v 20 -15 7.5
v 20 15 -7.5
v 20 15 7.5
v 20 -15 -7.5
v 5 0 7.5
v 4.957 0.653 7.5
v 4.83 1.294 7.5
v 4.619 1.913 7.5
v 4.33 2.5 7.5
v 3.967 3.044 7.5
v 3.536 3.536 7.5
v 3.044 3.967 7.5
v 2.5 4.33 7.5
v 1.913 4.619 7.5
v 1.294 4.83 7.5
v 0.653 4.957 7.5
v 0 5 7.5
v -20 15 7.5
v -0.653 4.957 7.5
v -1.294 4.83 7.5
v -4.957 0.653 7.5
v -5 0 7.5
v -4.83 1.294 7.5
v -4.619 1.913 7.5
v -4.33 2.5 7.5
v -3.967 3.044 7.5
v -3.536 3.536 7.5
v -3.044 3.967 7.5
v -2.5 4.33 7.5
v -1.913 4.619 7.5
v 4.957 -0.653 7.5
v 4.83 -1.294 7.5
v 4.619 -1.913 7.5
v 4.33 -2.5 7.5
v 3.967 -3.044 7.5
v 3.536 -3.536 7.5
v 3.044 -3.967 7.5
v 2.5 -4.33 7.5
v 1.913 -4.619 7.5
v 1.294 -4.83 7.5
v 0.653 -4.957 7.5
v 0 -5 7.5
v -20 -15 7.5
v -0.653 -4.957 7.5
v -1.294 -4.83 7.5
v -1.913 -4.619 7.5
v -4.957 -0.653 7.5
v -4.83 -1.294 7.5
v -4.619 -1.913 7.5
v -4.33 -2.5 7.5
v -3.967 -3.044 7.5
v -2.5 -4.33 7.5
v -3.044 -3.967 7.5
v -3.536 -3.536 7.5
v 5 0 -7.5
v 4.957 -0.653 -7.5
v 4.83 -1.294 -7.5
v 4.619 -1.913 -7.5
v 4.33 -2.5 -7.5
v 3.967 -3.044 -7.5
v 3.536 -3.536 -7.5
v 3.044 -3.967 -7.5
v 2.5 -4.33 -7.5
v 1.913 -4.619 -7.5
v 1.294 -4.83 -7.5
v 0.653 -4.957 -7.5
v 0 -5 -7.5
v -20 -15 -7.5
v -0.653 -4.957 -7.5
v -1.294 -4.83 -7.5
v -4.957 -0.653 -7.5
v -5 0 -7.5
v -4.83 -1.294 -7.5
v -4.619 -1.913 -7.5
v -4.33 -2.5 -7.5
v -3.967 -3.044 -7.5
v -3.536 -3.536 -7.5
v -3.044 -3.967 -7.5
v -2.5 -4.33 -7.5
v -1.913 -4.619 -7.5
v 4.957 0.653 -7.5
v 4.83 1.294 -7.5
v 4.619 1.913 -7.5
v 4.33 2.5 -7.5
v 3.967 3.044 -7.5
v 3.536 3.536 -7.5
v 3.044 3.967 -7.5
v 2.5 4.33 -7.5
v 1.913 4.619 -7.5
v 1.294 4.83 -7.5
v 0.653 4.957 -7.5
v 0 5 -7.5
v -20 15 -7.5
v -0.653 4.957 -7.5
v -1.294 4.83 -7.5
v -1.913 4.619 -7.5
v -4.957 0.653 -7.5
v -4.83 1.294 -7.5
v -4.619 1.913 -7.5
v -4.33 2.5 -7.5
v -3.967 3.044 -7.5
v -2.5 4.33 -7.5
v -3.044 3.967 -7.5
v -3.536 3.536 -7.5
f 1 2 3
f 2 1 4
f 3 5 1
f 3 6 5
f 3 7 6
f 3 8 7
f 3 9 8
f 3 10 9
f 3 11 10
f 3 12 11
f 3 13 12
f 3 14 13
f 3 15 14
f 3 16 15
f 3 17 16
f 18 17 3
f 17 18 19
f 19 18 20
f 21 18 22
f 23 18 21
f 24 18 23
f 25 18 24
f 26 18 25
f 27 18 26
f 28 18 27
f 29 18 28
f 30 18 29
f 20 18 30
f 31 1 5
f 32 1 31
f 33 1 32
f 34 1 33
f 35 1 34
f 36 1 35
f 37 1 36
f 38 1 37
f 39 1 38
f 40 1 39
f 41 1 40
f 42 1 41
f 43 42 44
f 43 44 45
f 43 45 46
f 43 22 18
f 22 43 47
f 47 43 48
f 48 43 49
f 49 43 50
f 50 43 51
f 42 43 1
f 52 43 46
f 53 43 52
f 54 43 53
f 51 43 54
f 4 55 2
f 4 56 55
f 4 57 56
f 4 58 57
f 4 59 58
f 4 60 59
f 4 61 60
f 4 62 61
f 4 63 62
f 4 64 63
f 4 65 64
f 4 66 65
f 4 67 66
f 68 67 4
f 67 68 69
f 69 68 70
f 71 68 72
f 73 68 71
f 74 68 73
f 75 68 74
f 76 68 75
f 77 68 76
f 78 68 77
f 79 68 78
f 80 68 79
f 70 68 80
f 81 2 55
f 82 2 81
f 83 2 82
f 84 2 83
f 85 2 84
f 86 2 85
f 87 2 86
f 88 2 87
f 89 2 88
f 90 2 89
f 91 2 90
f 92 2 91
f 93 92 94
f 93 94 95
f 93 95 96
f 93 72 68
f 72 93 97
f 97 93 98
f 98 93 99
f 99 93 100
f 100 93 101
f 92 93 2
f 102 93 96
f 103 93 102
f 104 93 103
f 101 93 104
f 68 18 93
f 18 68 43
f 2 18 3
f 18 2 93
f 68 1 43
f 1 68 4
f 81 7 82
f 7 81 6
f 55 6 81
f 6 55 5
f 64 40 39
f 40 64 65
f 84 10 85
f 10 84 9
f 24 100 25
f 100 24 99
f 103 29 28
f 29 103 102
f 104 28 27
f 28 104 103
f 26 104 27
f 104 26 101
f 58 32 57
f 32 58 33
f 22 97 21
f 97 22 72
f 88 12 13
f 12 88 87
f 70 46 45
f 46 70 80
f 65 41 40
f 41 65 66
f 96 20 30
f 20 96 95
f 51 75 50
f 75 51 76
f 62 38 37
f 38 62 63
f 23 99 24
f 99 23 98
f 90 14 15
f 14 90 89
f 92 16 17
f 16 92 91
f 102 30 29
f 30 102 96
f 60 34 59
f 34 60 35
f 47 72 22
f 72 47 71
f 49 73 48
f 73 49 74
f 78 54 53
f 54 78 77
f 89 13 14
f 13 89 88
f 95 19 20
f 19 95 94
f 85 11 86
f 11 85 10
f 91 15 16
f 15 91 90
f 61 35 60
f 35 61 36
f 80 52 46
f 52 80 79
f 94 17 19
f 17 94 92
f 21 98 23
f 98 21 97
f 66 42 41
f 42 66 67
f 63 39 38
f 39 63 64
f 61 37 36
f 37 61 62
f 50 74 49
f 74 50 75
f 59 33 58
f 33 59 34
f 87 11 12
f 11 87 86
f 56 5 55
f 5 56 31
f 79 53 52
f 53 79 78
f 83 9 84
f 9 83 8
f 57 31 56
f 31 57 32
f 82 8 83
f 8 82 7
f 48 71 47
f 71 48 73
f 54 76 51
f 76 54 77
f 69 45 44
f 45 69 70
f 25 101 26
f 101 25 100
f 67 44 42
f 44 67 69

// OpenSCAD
// Make a block with a hole. All sizes are in millimeters.
width = 40; // [20:1:80]
height = 15; // [5:1:35]
hole = 10; // [4:1:16]
/* [Hidden] */
$fn=48;
difference() {
 cube([width,30,height],center=true);
 cylinder(d=hole,h=height+2,center=true);
}
